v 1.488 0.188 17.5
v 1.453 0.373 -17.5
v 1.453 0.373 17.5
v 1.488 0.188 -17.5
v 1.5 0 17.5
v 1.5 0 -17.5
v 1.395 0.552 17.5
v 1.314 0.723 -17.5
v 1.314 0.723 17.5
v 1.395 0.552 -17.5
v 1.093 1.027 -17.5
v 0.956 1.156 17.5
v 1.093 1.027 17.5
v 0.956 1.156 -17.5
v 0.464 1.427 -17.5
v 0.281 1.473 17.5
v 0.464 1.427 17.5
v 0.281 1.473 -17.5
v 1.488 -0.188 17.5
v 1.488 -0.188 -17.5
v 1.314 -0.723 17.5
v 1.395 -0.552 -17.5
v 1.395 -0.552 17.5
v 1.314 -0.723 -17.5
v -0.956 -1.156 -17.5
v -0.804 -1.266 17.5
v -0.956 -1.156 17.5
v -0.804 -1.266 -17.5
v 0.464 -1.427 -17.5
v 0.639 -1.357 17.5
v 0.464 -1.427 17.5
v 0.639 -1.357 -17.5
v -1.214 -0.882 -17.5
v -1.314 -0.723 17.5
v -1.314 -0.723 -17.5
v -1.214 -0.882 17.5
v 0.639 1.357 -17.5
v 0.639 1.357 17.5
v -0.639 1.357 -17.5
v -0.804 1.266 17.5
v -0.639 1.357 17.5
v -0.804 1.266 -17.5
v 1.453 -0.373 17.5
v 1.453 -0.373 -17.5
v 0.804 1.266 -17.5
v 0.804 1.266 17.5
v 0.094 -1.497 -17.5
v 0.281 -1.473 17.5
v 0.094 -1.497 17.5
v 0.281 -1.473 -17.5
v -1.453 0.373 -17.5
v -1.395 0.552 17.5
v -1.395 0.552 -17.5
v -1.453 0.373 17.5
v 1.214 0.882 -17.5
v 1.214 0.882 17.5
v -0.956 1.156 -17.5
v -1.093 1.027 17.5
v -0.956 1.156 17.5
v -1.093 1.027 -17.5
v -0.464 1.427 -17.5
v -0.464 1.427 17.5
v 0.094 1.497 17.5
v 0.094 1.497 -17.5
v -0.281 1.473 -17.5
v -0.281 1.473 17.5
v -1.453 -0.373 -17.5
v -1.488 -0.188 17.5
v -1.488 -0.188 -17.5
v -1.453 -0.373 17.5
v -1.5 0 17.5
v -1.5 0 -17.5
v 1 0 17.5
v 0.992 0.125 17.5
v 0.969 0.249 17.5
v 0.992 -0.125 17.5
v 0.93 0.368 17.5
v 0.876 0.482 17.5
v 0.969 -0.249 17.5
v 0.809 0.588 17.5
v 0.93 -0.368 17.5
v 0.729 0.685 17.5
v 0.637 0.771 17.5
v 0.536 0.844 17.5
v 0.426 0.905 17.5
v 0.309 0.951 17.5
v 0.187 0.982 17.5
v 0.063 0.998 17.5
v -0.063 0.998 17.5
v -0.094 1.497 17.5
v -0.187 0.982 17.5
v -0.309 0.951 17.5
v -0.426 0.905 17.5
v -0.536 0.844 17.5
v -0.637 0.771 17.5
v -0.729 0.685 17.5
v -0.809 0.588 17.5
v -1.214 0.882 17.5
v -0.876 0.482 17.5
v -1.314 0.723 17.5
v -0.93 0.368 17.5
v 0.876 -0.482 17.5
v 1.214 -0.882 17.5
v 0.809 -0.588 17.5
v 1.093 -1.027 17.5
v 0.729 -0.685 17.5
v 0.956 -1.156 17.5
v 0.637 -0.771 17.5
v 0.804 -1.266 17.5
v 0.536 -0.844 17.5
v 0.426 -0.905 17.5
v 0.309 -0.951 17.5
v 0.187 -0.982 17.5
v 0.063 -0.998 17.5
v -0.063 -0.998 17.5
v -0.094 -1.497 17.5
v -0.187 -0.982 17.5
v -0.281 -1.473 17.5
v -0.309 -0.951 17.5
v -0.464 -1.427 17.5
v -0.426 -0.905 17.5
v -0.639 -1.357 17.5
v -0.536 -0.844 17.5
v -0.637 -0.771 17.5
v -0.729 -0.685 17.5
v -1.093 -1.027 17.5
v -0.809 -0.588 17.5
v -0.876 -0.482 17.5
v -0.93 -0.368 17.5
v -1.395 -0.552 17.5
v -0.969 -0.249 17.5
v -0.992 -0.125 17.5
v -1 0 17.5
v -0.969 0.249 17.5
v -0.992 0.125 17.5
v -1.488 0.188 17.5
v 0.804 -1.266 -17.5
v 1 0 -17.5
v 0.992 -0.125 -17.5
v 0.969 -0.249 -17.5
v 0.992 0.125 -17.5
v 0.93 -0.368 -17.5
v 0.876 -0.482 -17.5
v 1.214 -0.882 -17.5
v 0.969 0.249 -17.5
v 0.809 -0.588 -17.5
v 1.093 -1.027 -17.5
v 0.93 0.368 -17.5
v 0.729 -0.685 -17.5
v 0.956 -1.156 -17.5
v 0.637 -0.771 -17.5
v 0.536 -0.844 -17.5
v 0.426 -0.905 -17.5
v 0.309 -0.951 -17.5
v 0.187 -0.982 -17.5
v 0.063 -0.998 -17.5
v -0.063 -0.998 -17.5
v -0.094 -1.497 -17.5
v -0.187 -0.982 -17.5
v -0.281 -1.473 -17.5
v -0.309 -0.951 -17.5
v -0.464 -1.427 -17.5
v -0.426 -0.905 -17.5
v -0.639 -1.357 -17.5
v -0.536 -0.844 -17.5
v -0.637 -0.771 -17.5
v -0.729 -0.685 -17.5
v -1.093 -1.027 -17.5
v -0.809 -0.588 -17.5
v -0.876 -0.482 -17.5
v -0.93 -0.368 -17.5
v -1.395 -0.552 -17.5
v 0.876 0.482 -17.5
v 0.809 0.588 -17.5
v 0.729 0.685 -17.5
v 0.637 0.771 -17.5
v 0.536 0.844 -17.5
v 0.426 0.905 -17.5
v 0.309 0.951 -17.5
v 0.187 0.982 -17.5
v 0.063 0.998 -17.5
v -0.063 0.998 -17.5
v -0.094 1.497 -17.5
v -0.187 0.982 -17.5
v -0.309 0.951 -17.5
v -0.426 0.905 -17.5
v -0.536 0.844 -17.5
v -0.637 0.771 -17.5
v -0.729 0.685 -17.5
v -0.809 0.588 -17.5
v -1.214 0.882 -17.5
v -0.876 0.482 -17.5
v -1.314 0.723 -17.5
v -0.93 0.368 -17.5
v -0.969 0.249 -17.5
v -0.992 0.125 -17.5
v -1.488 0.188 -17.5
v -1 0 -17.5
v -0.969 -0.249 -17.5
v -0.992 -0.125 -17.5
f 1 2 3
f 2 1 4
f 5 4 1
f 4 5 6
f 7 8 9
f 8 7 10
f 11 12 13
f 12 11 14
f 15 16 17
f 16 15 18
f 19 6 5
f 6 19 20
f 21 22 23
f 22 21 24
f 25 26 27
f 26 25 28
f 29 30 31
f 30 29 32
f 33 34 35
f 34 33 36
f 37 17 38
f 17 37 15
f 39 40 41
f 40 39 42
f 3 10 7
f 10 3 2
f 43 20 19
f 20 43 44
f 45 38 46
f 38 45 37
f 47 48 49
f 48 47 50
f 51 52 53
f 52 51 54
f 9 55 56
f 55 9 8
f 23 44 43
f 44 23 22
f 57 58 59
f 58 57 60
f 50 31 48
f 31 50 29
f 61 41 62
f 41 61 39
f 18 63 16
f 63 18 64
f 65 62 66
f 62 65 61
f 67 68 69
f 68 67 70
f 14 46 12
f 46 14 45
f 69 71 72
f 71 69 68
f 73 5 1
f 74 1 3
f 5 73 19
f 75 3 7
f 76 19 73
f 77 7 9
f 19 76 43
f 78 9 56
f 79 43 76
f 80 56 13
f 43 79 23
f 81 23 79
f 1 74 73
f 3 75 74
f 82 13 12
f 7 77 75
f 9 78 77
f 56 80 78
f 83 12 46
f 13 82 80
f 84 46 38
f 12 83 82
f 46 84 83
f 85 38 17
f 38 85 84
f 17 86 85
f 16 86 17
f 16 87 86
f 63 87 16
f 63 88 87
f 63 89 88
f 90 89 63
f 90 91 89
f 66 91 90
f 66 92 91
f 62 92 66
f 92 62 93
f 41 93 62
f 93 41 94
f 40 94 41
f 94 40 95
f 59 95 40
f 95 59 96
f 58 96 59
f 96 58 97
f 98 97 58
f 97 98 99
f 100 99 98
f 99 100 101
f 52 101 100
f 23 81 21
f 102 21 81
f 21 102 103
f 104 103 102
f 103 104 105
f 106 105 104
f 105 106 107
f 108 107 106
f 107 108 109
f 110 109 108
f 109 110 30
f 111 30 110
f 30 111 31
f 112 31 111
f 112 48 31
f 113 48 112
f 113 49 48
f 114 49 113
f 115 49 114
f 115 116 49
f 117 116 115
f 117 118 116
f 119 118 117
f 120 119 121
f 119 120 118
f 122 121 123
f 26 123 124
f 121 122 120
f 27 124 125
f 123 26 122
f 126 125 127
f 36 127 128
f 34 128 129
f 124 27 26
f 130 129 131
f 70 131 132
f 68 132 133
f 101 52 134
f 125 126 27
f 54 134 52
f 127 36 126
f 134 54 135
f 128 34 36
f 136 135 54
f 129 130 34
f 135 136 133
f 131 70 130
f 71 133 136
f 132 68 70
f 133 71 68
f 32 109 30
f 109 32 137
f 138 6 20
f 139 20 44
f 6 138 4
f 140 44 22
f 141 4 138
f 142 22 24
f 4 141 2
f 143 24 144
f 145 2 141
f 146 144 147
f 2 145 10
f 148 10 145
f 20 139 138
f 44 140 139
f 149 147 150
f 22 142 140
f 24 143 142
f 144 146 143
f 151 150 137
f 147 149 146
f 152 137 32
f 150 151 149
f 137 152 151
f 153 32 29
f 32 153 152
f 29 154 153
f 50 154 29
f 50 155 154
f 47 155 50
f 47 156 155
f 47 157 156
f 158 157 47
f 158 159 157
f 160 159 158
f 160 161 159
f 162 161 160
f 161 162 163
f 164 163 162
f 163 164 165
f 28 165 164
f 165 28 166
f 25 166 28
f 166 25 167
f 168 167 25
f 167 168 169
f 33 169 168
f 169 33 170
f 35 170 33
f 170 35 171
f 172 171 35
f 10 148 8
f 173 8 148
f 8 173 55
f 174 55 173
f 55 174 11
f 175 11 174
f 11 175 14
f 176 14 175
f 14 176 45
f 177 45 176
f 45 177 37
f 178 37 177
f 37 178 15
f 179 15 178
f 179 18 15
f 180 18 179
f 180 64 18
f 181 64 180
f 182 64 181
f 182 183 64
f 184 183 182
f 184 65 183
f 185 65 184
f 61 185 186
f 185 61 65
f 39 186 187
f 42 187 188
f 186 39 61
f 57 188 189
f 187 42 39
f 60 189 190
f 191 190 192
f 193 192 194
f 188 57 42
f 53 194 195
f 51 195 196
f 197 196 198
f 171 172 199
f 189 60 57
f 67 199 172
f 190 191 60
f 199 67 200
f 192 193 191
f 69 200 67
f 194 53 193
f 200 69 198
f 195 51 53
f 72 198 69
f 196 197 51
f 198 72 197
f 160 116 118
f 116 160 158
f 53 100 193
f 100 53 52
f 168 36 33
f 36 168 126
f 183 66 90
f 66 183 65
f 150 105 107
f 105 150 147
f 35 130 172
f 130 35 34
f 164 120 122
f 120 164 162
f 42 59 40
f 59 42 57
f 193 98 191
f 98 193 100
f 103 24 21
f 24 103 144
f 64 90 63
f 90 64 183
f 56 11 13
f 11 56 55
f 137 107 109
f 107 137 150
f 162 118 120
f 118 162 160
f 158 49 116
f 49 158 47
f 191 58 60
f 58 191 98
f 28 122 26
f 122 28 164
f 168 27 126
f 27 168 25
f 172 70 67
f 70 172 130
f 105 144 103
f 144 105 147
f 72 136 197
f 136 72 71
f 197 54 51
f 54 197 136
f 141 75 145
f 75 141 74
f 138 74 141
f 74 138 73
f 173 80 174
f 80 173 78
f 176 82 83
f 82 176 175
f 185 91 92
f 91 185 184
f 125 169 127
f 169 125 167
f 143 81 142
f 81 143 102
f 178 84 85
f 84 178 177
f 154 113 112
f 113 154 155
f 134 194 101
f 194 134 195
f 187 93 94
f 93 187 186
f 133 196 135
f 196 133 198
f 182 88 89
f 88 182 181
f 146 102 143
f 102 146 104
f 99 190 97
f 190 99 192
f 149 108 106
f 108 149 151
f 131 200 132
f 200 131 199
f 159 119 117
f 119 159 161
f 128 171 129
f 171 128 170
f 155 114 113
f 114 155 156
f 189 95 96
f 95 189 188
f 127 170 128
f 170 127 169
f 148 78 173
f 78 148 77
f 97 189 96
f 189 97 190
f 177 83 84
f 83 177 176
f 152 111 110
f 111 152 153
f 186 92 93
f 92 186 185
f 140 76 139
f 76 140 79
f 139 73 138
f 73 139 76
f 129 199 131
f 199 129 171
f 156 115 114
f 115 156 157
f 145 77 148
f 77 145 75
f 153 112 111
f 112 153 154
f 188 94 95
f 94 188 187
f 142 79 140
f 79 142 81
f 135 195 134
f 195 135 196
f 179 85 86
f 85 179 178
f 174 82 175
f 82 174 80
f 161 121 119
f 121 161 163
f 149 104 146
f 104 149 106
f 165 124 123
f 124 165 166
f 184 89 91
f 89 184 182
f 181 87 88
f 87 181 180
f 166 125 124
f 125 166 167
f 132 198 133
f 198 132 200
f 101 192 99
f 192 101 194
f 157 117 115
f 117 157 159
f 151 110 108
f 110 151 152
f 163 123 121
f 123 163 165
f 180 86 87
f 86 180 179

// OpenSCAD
$fn = 50;


difference() {
	union() {
		translate(v = [0, 0, -17.5000000000]) {
			cylinder(h = 35, r = 1.5000000000);
		}
	}
	union() {
		translate(v = [0, 0, -100.0000000000]) {
			cylinder(h = 200, r = 1.0000000000);
		}
	}
}
